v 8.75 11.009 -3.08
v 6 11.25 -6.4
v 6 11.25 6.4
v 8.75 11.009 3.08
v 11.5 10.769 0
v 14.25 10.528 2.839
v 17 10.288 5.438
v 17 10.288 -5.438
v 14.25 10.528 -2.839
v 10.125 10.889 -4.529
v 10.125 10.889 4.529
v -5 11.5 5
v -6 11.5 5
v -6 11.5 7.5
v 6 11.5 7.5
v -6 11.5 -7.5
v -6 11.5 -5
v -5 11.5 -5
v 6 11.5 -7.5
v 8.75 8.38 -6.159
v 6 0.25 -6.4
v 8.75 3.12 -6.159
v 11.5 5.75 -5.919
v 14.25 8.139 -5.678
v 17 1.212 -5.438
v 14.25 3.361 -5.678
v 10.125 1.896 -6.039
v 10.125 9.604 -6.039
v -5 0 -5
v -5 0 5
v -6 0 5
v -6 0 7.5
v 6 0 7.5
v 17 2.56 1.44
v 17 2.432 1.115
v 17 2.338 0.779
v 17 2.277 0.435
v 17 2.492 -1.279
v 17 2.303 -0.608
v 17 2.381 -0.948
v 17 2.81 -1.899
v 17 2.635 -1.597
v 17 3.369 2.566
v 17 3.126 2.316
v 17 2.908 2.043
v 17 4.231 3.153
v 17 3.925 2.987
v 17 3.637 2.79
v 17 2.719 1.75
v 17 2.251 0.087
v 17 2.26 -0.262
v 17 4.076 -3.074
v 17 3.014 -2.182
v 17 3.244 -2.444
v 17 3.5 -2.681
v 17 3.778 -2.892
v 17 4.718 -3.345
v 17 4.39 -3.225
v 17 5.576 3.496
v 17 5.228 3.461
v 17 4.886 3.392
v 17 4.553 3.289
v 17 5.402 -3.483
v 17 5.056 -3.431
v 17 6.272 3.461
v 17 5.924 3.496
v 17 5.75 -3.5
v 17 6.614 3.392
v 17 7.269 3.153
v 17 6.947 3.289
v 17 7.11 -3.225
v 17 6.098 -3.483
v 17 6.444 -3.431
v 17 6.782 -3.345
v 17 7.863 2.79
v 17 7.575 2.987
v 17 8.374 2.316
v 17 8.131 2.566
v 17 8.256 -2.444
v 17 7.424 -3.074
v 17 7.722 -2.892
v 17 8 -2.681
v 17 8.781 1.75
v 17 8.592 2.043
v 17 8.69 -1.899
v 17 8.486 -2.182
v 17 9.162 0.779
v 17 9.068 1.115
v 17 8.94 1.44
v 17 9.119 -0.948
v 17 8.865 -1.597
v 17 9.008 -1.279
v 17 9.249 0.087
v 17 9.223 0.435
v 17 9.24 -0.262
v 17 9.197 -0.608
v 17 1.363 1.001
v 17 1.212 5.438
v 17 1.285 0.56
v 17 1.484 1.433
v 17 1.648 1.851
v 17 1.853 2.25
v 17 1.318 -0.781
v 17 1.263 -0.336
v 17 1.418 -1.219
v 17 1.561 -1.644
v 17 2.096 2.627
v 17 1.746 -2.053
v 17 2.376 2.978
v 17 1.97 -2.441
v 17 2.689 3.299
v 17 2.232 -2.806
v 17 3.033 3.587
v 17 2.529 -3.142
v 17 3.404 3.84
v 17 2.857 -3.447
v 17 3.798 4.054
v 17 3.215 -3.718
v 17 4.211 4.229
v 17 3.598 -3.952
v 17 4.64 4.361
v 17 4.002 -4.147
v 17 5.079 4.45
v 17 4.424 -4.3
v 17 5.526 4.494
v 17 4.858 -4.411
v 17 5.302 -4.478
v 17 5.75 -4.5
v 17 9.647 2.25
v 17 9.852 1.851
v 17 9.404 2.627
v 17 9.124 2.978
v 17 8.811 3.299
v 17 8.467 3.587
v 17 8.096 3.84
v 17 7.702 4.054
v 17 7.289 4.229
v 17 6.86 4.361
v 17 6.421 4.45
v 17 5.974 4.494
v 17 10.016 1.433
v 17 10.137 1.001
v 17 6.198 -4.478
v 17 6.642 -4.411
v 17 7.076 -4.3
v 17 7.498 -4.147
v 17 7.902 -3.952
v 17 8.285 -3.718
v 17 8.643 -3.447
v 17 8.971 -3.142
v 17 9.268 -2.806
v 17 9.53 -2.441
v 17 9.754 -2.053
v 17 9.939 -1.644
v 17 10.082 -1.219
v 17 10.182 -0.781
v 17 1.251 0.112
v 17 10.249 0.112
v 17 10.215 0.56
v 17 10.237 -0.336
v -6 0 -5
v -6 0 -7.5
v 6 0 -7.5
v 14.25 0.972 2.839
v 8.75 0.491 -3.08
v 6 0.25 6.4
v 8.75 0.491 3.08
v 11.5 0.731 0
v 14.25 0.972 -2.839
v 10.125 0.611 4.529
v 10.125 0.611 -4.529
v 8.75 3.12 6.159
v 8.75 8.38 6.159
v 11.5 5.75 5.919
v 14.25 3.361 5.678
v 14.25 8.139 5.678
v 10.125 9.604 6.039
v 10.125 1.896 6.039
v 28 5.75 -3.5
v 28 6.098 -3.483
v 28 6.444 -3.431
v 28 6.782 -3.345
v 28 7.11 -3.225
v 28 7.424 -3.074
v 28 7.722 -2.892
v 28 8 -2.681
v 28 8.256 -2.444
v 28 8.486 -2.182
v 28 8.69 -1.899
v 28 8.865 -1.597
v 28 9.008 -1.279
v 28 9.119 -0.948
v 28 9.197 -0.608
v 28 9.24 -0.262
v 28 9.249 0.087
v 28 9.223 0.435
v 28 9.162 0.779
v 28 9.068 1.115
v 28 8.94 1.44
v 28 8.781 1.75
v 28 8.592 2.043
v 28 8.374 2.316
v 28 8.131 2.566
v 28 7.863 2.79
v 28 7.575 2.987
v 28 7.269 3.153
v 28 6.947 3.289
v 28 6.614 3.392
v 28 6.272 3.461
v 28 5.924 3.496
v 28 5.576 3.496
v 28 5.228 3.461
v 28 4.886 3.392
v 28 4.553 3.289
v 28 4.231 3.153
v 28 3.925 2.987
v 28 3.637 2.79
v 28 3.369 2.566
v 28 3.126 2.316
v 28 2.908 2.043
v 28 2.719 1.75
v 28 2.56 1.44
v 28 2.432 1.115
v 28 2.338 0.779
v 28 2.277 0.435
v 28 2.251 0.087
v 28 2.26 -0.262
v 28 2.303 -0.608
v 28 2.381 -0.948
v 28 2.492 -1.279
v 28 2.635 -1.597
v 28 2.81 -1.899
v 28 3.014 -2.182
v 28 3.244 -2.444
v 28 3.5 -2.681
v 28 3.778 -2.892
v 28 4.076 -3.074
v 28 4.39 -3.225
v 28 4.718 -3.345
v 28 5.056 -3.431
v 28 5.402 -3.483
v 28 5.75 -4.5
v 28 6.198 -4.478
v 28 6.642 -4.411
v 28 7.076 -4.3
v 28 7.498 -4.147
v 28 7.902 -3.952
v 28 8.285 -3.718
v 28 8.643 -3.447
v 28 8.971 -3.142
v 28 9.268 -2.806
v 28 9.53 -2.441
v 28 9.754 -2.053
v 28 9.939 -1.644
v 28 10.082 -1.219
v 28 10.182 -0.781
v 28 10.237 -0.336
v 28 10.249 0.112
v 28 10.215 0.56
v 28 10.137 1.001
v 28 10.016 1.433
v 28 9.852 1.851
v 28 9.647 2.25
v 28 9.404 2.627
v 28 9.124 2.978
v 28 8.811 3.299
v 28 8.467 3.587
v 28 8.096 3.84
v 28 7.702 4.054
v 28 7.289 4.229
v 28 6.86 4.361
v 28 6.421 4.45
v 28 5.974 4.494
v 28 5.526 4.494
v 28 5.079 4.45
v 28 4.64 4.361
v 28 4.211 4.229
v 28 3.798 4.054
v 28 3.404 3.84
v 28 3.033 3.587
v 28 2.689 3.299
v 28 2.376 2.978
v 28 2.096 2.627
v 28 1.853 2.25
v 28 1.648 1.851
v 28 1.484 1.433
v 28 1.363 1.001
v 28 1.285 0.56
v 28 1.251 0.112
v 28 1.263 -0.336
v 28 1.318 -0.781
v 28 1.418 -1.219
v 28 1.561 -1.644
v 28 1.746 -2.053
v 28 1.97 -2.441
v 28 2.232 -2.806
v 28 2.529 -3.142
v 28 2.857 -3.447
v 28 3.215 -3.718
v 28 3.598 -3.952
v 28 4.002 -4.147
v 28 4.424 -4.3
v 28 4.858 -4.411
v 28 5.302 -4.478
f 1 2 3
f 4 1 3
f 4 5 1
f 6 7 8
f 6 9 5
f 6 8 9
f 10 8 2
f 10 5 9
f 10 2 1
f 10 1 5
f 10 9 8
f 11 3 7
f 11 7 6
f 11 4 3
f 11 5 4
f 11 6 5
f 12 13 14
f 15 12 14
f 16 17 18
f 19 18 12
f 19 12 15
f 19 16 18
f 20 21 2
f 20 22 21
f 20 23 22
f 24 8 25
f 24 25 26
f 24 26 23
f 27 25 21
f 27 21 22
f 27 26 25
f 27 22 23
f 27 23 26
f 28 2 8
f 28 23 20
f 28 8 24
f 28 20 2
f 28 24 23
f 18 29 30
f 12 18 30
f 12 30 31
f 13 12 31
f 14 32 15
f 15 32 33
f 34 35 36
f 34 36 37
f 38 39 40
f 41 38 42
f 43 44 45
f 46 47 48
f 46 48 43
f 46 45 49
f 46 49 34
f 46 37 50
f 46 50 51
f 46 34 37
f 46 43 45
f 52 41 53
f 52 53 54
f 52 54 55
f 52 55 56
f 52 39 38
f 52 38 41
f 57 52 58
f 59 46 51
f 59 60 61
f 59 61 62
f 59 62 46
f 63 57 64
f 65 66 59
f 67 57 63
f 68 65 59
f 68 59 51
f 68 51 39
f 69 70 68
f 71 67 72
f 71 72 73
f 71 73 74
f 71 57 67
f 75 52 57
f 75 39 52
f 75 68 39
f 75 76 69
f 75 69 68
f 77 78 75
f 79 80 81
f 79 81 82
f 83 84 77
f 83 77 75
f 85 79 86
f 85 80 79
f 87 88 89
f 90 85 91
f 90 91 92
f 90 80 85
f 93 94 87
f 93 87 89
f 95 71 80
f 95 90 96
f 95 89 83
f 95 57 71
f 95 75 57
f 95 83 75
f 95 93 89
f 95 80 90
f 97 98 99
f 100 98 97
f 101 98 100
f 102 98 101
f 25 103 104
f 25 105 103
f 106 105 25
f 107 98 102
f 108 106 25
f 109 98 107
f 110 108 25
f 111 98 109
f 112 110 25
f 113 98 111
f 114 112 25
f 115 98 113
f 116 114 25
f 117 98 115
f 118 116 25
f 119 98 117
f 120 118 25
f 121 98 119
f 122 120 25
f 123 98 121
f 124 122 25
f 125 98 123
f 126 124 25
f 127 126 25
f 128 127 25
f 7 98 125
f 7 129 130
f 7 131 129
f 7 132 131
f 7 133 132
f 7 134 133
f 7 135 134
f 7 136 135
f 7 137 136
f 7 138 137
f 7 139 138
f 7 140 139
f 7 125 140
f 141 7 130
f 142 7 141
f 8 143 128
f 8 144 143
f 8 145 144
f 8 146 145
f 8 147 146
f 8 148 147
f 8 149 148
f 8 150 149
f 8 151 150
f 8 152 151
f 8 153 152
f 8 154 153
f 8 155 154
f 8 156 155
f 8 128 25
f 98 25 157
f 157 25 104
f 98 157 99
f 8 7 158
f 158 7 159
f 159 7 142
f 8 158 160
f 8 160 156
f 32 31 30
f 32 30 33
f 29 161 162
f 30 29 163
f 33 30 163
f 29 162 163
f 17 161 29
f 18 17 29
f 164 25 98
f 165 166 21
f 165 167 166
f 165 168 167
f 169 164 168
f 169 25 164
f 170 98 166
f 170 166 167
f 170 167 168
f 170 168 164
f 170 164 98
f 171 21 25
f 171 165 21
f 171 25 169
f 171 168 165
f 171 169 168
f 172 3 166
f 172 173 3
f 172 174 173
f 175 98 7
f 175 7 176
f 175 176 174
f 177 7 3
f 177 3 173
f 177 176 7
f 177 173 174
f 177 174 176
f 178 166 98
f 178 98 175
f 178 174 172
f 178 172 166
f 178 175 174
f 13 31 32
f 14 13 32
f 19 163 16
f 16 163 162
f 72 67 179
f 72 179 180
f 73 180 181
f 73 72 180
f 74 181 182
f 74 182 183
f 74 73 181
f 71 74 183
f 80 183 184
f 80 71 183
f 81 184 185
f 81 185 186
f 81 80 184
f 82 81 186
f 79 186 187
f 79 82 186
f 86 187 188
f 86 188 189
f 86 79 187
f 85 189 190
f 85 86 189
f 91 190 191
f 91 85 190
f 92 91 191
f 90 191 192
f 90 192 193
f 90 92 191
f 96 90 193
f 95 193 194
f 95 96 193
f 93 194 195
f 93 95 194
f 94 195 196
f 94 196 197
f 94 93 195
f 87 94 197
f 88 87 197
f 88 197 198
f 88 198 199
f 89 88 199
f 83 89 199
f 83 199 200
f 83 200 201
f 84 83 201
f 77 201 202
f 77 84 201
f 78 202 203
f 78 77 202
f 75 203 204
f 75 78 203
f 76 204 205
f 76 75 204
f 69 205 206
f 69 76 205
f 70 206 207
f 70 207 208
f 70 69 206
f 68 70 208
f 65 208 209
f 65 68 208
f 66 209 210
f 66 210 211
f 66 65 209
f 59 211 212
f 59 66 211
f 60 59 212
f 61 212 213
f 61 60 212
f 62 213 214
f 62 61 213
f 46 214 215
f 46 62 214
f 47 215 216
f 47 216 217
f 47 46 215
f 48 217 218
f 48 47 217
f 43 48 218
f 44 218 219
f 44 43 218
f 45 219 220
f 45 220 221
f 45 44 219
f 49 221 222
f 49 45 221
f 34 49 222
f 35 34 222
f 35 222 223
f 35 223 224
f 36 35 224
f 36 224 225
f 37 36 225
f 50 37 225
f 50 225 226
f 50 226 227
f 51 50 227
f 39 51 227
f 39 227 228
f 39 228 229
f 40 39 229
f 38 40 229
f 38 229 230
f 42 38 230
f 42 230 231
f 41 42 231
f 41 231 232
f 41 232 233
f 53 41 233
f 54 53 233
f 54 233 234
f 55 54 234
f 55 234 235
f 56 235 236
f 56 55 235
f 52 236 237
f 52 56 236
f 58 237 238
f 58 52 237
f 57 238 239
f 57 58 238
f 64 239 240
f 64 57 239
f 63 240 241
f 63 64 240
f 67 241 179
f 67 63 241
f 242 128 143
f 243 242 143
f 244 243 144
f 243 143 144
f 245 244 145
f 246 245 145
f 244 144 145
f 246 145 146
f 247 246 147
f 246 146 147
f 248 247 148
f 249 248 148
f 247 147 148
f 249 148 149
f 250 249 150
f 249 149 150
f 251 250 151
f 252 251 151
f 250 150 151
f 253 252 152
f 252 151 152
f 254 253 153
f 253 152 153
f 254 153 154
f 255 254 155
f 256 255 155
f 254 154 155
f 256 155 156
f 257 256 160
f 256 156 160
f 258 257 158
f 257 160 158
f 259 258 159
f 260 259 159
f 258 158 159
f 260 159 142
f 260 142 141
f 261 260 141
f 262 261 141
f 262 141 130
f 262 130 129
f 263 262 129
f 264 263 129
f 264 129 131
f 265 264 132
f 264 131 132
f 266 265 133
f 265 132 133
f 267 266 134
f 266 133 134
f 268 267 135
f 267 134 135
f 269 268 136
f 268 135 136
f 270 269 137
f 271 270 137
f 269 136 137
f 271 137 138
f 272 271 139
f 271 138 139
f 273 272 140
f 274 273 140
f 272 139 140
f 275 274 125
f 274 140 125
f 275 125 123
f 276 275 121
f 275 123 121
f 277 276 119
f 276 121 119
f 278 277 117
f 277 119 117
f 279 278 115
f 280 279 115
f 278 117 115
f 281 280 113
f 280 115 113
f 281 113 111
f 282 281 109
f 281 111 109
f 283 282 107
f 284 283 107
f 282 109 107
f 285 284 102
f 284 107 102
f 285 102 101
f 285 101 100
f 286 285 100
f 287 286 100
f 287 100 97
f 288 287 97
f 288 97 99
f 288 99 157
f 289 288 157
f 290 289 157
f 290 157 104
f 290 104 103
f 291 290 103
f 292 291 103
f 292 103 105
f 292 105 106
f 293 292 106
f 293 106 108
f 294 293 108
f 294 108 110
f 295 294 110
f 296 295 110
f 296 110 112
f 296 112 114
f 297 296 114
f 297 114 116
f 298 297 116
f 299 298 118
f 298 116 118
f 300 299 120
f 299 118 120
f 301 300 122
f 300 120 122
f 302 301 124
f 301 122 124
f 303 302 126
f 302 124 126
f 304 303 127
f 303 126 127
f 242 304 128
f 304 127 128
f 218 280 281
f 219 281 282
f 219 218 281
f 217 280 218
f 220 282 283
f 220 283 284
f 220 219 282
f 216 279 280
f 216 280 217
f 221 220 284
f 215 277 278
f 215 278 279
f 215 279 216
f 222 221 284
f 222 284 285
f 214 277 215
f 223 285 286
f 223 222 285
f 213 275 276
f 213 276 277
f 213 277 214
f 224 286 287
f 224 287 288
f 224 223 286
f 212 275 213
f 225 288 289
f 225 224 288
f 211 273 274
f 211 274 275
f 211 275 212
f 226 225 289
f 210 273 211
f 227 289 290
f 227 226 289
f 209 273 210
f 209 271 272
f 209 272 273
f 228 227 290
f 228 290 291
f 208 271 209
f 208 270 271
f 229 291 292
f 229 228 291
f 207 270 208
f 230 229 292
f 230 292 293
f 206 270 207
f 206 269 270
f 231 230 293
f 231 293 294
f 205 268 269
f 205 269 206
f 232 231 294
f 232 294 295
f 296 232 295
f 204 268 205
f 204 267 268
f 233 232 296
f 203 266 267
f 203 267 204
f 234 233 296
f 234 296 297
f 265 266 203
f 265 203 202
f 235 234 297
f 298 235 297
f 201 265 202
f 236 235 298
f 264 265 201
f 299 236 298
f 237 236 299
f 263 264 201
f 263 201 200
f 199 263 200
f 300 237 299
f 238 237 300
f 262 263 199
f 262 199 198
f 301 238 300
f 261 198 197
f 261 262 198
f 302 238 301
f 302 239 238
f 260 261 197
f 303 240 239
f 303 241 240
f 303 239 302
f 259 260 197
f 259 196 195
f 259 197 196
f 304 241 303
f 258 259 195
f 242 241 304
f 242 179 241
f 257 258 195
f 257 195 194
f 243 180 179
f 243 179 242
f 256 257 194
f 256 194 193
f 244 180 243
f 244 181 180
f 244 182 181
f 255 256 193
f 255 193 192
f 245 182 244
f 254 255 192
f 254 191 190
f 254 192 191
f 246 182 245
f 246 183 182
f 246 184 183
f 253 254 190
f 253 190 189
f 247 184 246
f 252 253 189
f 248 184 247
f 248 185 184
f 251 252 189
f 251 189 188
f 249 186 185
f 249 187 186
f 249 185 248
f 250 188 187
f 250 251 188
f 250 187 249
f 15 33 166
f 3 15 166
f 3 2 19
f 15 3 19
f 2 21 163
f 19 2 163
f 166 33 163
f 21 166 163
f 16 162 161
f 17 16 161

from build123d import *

# Parameters (mm, degrees)
BOSS_EXTRUDE1_DEPTH = 11.5
SKETCH4_W           = 12.8
SKETCH4_H           = 11
BOSS_EXTRUDE2_DEPTH = 11
BOSS_EXTRUDE2_TAPER = 5
SKETCH5_R           = 4.5
SKETCH5_R_2         = 3.5
BOSS_EXTRUDE3_DEPTH = 11


with BuildPart() as part:
    # Sketch2 → Boss-Extrude1 (new body)
    with BuildSketch(Plane(origin=(0, 0, 0), x_dir=(1, 0, 0), z_dir=(0, 1, 0))):
        Polygon((-6, -5), (-6, -7.5), (6, -7.5), (6, 7.5), (-6, 7.5), (-6, 5), (-5, 5), (-5, -5), align=None)
    extrude(amount=BOSS_EXTRUDE1_DEPTH)

    # Sketch4 → Boss-Extrude2 (add)
    with BuildSketch(Plane(origin=(6, 0, 0), x_dir=(0, 0, -1), z_dir=(1, 0, 0))):
        with Locations((0, 5.75)):
            Rectangle(SKETCH4_W, SKETCH4_H)
    extrude(amount=BOSS_EXTRUDE2_DEPTH, taper=BOSS_EXTRUDE2_TAPER)

    # Sketch5 → Boss-Extrude3 (add)
    with BuildSketch(Plane(origin=(17, 0, 0), x_dir=(0, 0, -1), z_dir=(1, 0, 0))):
        with Locations((0, 5.75)):
            Circle(SKETCH5_R)
        with Locations((0, 5.75)):
            Circle(SKETCH5_R_2, mode=Mode.SUBTRACT)
    extrude(amount=BOSS_EXTRUDE3_DEPTH)


solid = part.part
